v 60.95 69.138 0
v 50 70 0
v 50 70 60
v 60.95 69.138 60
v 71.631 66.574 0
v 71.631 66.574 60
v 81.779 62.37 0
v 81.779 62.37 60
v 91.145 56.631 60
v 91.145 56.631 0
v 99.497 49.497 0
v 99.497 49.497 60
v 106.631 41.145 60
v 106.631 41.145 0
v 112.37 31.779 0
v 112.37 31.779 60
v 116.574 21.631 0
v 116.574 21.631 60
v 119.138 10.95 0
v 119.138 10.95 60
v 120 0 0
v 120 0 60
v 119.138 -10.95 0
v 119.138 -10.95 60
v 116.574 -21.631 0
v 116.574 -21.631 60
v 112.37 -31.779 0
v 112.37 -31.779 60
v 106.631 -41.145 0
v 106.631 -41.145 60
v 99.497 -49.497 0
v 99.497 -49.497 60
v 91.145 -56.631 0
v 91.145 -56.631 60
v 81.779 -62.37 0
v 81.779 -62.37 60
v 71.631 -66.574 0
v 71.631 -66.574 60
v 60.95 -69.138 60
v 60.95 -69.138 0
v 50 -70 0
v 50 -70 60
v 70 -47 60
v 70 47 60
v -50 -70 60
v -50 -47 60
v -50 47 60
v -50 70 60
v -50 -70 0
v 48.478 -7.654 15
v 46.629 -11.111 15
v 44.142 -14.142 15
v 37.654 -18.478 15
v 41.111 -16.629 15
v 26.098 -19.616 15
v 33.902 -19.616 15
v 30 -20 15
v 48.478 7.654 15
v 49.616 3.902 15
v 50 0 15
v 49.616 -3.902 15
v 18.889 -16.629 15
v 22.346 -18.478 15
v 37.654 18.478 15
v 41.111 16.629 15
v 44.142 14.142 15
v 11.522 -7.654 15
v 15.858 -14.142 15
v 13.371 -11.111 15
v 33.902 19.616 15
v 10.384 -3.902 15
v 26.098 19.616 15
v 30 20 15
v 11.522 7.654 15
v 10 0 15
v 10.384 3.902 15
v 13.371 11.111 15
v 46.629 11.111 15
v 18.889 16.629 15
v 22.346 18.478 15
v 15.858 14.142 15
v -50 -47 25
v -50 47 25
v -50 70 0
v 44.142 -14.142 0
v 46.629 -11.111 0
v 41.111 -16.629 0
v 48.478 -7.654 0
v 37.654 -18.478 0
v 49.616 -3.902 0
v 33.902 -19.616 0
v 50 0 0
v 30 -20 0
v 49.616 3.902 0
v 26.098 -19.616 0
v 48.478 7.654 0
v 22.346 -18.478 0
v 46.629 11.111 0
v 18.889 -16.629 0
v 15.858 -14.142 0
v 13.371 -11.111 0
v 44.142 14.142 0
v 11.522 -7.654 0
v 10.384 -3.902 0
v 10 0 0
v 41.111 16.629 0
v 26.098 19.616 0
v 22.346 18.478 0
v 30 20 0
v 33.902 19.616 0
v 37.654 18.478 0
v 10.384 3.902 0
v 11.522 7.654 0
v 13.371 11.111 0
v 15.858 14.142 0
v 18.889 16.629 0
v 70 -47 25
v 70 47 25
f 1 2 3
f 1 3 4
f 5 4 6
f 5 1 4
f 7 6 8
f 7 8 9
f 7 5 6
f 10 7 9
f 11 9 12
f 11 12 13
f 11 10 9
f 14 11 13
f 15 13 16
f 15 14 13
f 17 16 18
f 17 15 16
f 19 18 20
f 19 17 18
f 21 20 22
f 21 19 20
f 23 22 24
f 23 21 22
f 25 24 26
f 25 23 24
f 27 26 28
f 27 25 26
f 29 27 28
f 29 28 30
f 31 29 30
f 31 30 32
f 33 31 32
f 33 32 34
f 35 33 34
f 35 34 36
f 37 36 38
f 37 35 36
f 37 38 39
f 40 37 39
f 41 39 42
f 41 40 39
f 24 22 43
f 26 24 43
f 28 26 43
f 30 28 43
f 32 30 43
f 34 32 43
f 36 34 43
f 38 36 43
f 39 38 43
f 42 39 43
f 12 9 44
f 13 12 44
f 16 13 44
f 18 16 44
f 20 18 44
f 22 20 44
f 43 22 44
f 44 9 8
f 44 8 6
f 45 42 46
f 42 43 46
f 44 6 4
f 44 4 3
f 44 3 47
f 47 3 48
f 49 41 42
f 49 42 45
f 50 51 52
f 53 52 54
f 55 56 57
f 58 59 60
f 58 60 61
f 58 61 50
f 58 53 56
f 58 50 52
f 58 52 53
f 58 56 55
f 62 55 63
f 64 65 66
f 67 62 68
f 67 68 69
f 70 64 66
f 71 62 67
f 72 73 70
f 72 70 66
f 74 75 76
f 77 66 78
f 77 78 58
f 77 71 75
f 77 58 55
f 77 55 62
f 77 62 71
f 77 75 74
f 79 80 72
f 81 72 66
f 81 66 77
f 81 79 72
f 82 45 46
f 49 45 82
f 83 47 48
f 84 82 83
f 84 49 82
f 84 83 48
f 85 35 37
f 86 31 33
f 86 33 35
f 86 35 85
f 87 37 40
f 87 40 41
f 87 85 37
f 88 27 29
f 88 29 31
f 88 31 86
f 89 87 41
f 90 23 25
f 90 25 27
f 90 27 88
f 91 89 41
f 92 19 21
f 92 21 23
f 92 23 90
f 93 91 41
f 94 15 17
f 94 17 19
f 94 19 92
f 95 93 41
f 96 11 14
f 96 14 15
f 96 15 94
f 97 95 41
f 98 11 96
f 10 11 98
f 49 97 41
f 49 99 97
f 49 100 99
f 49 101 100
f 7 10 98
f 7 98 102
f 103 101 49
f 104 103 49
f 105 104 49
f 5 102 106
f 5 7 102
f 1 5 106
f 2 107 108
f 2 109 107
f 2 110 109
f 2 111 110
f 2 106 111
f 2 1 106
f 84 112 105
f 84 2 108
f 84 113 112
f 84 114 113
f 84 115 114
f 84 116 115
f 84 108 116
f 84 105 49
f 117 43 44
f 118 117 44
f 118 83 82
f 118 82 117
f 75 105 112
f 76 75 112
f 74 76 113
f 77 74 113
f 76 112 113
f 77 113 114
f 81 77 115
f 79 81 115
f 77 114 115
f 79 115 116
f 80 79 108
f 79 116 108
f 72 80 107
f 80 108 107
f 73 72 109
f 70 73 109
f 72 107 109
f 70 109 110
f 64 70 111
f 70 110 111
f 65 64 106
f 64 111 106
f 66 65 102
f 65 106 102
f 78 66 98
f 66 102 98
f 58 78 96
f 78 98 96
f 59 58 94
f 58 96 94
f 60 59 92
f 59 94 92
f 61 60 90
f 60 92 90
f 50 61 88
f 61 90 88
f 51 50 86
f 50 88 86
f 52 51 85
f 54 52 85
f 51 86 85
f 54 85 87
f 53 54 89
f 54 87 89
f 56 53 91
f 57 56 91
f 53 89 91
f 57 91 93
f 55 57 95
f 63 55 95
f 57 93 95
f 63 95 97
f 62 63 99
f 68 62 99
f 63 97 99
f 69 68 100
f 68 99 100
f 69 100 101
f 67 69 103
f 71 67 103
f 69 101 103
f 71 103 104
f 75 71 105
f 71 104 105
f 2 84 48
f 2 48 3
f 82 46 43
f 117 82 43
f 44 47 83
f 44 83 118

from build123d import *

# Parameters (mm, degrees)
EXTRUDE_1_DEPTH     = 60
SKETCH_2_W          = 120
SKETCH_2_H          = 94
CUT_EXTRUDE_1_DEPTH = 35
SKETCH_3_R          = 20
CUT_EXTRUDE_2_DEPTH = 15


with BuildPart() as part:
    # ｽｹｯﾁ1 → ﾎﾞｽ - 押し出し1 (new body)
    with BuildSketch(Plane.XY):
        with BuildLine():
            Line((-50, 70), (50, 70))
            ThreePointArc((50, 70), (120, 0), (50, -70))
            Line((50, -70), (-50, -70))
            Line((-50, -70), (-50, 70))
        make_face()
    extrude(amount=EXTRUDE_1_DEPTH)

    # ｽｹｯﾁ2 → ｶｯﾄ - 押し出し1 (cut)
    with BuildSketch(Plane.XY.offset(60)):
        with Locations((10, 0)):
            Rectangle(SKETCH_2_W, SKETCH_2_H)
    extrude(amount=-CUT_EXTRUDE_1_DEPTH, mode=Mode.SUBTRACT)

    # ｽｹｯﾁ3 → ｶｯﾄ - 押し出し2 (cut)
    with BuildSketch(Plane(origin=(0, 0, 0), x_dir=(-1, 0, 0), z_dir=(0, 0, -1))):
        with Locations((-30, 0)):
            Circle(SKETCH_3_R)
    extrude(amount=-CUT_EXTRUDE_2_DEPTH, mode=Mode.SUBTRACT)


solid = part.part
